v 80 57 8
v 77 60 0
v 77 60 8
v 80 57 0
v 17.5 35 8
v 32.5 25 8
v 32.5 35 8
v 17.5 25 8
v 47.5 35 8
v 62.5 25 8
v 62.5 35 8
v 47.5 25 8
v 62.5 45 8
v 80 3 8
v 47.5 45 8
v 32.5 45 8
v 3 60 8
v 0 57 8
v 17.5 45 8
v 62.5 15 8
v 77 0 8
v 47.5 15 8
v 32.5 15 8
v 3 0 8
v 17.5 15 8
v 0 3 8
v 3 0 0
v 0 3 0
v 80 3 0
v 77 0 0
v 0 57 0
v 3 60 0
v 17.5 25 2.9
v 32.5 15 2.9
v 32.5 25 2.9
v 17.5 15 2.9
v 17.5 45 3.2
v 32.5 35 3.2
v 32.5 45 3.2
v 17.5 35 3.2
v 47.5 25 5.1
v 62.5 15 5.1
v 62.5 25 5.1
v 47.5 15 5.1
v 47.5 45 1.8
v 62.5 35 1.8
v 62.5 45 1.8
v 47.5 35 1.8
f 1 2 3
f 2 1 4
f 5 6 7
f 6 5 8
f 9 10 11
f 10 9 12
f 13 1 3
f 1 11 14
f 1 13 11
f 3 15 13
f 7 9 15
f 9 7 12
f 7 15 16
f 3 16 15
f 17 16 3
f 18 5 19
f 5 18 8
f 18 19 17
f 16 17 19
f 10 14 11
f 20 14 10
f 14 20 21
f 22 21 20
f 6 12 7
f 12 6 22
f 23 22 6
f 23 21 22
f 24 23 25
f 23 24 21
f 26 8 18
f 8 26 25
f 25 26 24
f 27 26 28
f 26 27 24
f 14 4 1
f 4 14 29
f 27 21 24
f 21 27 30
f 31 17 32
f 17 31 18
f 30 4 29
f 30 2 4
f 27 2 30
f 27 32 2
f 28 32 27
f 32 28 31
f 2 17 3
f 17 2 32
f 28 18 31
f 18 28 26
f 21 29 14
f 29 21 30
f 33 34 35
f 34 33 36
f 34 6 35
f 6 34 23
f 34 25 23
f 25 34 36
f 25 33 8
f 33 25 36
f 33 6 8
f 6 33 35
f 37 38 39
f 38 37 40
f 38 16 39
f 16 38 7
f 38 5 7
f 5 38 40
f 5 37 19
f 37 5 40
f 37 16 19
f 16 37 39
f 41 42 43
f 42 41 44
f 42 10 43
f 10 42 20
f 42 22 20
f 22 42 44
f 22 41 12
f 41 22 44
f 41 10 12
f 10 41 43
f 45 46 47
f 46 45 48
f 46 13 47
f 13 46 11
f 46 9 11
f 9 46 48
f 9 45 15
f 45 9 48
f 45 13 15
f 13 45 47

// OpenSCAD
$fn = 32;

// ----------------------------------------------------------------------
// Windowed plate: 4 voids, 80 x 60 x 8 mm
// ----------------------------------------------------------------------

// --- parameters (mm) ---
plate_l = 80;             // plate length, X
plate_w = 60;             // plate width, Y
plate_t = 8;              // plate thickness, Z
edge_margin = 10;         // wall from the plate edge to any window
win_l = 15;               // pocket length
win_w = 10;               // pocket width
pitch_x = 30;             // grid pitch along X
pitch_y = 20;             // grid pitch along Y
depth_1 = 5.1;            // depth of void 1 (full thickness = through)
depth_2 = 4.8;            // depth of void 2 (full thickness = through)
depth_3 = 2.9;            // depth of void 3 (full thickness = through)
depth_4 = 6.2;            // depth of void 4 (full thickness = through)
corner_c = 3;             // corner chamfer of the plate

profile = [[3, 0], [77, 0], [80, 3], [80, 57], [77, 60], [3, 60], [0, 57], [0, 3]];  // primary outline, 8 points, counter clockwise
void_1 = [[17.5, 15], [32.5, 15], [32.5, 25], [17.5, 25]];  // pocket at grid node 0,0, 4 points
void_2 = [[17.5, 35], [32.5, 35], [32.5, 45], [17.5, 45]];  // pocket at grid node 0,1, 4 points
void_3 = [[47.5, 15], [62.5, 15], [62.5, 25], [47.5, 25]];  // pocket at grid node 1,0, 4 points
void_4 = [[47.5, 35], [62.5, 35], [62.5, 45], [47.5, 45]];  // pocket at grid node 1,1, 4 points

// --- the one profile operation ---
difference() {
  linear_extrude(height = plate_t) polygon(points = profile);
  translate([0, 0, plate_t - depth_1])
    linear_extrude(height = depth_1 + 1) polygon(points = void_1);
  translate([0, 0, plate_t - depth_2])
    linear_extrude(height = depth_2 + 1) polygon(points = void_2);
  translate([0, 0, plate_t - depth_3])
    linear_extrude(height = depth_3 + 1) polygon(points = void_3);
  translate([0, 0, plate_t - depth_4])
    linear_extrude(height = depth_4 + 1) polygon(points = void_4);
}
